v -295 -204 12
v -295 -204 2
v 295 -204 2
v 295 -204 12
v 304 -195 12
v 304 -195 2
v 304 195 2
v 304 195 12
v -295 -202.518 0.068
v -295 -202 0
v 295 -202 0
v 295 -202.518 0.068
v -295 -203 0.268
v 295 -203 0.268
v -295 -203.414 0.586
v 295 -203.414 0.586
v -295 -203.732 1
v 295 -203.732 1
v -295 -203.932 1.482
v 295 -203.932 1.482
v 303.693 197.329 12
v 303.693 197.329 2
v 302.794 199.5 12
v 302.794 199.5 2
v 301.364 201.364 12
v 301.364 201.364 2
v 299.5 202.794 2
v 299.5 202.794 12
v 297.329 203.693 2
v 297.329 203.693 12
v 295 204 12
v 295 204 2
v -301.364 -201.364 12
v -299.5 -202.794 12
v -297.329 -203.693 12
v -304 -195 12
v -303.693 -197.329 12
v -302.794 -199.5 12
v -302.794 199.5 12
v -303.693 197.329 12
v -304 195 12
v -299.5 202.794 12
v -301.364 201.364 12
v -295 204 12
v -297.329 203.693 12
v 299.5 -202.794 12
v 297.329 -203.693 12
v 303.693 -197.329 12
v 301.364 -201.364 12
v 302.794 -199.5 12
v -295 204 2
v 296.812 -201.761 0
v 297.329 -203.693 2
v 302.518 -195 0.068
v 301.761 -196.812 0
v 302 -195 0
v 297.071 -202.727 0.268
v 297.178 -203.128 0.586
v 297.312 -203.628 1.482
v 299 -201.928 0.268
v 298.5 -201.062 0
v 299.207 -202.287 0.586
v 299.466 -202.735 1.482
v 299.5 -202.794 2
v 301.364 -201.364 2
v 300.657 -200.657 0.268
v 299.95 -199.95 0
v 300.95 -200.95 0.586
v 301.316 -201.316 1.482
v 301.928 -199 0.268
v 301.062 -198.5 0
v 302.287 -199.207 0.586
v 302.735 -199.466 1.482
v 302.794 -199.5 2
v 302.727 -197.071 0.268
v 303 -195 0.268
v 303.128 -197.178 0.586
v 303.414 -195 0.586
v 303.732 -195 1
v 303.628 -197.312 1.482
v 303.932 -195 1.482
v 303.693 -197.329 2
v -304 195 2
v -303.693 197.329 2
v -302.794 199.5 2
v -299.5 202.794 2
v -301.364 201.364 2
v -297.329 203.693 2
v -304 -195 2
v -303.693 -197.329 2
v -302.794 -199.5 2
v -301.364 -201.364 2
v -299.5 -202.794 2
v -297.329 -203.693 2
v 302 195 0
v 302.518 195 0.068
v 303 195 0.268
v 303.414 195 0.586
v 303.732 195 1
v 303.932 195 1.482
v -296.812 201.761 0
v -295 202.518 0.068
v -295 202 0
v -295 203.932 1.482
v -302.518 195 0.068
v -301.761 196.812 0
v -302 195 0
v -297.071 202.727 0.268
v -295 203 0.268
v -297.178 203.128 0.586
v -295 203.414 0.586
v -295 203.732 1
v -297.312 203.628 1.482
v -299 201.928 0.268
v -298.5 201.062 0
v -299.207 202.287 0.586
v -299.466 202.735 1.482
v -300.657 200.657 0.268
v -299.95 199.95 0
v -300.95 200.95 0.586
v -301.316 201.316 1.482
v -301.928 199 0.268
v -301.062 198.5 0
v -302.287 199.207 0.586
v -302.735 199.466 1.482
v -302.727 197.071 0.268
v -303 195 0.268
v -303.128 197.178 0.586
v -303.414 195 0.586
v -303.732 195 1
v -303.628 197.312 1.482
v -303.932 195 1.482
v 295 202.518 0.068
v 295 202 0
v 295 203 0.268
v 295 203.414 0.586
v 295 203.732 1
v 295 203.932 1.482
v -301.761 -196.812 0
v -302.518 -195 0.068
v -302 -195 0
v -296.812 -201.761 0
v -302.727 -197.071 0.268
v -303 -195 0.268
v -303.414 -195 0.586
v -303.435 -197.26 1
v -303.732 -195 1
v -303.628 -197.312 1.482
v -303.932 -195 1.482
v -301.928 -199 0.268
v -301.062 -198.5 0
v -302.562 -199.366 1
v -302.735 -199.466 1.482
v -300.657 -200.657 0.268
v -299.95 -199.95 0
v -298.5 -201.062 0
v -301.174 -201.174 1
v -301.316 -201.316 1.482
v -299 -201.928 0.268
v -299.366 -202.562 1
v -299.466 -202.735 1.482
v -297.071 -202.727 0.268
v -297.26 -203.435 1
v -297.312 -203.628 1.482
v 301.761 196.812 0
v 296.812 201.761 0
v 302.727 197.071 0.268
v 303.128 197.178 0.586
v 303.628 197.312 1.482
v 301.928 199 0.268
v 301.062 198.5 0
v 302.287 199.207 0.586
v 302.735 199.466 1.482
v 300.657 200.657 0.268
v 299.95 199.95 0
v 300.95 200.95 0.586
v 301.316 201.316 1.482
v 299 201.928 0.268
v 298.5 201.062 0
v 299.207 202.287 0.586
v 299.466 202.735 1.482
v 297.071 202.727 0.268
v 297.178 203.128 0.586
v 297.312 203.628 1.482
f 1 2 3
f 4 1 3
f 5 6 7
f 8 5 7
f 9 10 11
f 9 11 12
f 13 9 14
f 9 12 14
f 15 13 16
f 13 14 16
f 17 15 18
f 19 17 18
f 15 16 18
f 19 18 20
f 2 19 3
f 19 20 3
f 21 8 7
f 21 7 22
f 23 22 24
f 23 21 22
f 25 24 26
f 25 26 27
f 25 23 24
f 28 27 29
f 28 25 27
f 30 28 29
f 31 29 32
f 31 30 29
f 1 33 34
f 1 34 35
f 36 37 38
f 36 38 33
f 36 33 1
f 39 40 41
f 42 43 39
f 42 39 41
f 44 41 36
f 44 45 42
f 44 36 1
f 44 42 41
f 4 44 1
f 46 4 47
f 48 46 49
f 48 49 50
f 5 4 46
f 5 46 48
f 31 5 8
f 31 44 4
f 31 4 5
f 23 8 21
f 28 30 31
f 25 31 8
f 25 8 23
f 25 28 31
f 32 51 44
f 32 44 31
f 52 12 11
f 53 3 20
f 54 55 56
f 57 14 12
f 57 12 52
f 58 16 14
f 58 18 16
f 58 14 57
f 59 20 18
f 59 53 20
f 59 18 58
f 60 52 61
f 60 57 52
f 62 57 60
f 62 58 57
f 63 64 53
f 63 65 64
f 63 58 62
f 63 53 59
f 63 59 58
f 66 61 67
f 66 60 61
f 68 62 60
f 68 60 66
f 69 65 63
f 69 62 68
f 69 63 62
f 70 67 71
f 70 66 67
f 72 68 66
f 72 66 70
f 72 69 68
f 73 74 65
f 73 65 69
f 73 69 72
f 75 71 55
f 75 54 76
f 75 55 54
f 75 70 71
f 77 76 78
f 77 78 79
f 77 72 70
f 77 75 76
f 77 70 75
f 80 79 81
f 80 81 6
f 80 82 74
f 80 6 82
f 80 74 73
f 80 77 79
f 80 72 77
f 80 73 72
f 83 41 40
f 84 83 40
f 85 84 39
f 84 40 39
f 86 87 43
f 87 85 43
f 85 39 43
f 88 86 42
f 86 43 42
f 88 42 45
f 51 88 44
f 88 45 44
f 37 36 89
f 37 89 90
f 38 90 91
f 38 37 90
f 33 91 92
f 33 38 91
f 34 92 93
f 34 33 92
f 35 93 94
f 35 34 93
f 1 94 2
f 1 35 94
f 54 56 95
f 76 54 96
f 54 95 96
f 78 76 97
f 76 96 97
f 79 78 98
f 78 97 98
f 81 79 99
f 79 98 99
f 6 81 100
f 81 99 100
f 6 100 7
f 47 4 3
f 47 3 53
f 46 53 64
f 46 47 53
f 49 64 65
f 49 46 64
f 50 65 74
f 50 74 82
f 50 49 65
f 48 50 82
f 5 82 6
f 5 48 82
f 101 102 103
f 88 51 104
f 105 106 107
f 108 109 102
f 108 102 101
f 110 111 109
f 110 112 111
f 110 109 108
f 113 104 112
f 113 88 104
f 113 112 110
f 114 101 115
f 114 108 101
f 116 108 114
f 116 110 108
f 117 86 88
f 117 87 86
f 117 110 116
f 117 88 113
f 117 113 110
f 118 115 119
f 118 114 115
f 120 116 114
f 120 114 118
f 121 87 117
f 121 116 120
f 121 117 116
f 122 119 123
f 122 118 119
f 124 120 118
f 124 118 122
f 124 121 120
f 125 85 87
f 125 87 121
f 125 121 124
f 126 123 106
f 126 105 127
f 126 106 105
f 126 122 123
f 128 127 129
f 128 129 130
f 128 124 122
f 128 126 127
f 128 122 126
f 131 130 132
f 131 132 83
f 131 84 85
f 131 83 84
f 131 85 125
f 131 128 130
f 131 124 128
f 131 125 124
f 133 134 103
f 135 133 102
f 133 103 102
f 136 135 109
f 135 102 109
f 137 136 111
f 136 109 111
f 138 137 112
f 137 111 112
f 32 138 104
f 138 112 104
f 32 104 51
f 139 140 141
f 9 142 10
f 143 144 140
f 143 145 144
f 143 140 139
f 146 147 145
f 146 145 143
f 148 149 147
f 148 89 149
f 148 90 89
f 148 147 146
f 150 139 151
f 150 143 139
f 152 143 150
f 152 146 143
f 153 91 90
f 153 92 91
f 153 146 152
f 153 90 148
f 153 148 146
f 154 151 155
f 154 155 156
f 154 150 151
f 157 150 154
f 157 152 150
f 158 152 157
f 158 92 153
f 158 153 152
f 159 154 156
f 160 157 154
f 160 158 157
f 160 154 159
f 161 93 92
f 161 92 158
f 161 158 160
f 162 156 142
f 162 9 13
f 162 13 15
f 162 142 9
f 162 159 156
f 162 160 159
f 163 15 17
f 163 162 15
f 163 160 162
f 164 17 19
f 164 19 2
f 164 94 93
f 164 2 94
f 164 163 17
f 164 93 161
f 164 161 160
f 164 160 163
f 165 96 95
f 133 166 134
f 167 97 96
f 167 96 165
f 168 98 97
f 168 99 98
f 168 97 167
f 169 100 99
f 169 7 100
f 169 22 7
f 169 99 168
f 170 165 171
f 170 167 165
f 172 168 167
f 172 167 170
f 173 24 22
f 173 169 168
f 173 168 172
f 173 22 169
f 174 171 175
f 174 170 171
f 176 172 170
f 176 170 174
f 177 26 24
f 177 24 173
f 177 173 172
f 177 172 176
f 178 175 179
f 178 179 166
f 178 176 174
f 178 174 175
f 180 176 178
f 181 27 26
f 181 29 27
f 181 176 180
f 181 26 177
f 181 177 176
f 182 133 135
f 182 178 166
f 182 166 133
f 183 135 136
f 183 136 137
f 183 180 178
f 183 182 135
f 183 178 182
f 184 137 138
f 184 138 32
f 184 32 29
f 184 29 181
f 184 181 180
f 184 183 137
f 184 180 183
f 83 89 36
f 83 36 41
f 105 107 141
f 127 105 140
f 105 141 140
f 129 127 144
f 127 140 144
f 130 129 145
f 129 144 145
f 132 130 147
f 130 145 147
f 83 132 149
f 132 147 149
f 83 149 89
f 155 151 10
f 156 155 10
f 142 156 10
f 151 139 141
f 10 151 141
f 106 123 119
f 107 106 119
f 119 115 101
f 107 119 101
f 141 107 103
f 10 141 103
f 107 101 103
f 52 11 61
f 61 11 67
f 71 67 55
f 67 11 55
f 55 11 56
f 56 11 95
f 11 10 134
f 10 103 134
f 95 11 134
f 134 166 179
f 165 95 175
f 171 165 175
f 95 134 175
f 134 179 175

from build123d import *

# Parameters (mm, degrees)
F0_W     = 608
F0_H     = 408
F1_DEPTH = 12
F2_R     = 9
F3_R     = 2


with BuildPart() as f1:
    # F0 (on Top) → F1 (new body)
    with BuildSketch(Plane.XY):
        Rectangle(F0_W, F0_H)
    extrude(amount=F1_DEPTH)

    # F2
    f2_edges = [f1.edges().sort_by_distance(p)[0] for p in [
        (-304, 204, 6),
        (-304, -204, 6),
        (304, -204, 6),
        (304, 204, 6),
    ]]
    fillet(f2_edges, radius=F2_R)

    # F3
    f3_edges = [f1.edges().sort_by_distance(p)[0] for p in [
        (0, -204, 0),
    ]]
    fillet(f3_edges, radius=F3_R)


solid = f1.part
